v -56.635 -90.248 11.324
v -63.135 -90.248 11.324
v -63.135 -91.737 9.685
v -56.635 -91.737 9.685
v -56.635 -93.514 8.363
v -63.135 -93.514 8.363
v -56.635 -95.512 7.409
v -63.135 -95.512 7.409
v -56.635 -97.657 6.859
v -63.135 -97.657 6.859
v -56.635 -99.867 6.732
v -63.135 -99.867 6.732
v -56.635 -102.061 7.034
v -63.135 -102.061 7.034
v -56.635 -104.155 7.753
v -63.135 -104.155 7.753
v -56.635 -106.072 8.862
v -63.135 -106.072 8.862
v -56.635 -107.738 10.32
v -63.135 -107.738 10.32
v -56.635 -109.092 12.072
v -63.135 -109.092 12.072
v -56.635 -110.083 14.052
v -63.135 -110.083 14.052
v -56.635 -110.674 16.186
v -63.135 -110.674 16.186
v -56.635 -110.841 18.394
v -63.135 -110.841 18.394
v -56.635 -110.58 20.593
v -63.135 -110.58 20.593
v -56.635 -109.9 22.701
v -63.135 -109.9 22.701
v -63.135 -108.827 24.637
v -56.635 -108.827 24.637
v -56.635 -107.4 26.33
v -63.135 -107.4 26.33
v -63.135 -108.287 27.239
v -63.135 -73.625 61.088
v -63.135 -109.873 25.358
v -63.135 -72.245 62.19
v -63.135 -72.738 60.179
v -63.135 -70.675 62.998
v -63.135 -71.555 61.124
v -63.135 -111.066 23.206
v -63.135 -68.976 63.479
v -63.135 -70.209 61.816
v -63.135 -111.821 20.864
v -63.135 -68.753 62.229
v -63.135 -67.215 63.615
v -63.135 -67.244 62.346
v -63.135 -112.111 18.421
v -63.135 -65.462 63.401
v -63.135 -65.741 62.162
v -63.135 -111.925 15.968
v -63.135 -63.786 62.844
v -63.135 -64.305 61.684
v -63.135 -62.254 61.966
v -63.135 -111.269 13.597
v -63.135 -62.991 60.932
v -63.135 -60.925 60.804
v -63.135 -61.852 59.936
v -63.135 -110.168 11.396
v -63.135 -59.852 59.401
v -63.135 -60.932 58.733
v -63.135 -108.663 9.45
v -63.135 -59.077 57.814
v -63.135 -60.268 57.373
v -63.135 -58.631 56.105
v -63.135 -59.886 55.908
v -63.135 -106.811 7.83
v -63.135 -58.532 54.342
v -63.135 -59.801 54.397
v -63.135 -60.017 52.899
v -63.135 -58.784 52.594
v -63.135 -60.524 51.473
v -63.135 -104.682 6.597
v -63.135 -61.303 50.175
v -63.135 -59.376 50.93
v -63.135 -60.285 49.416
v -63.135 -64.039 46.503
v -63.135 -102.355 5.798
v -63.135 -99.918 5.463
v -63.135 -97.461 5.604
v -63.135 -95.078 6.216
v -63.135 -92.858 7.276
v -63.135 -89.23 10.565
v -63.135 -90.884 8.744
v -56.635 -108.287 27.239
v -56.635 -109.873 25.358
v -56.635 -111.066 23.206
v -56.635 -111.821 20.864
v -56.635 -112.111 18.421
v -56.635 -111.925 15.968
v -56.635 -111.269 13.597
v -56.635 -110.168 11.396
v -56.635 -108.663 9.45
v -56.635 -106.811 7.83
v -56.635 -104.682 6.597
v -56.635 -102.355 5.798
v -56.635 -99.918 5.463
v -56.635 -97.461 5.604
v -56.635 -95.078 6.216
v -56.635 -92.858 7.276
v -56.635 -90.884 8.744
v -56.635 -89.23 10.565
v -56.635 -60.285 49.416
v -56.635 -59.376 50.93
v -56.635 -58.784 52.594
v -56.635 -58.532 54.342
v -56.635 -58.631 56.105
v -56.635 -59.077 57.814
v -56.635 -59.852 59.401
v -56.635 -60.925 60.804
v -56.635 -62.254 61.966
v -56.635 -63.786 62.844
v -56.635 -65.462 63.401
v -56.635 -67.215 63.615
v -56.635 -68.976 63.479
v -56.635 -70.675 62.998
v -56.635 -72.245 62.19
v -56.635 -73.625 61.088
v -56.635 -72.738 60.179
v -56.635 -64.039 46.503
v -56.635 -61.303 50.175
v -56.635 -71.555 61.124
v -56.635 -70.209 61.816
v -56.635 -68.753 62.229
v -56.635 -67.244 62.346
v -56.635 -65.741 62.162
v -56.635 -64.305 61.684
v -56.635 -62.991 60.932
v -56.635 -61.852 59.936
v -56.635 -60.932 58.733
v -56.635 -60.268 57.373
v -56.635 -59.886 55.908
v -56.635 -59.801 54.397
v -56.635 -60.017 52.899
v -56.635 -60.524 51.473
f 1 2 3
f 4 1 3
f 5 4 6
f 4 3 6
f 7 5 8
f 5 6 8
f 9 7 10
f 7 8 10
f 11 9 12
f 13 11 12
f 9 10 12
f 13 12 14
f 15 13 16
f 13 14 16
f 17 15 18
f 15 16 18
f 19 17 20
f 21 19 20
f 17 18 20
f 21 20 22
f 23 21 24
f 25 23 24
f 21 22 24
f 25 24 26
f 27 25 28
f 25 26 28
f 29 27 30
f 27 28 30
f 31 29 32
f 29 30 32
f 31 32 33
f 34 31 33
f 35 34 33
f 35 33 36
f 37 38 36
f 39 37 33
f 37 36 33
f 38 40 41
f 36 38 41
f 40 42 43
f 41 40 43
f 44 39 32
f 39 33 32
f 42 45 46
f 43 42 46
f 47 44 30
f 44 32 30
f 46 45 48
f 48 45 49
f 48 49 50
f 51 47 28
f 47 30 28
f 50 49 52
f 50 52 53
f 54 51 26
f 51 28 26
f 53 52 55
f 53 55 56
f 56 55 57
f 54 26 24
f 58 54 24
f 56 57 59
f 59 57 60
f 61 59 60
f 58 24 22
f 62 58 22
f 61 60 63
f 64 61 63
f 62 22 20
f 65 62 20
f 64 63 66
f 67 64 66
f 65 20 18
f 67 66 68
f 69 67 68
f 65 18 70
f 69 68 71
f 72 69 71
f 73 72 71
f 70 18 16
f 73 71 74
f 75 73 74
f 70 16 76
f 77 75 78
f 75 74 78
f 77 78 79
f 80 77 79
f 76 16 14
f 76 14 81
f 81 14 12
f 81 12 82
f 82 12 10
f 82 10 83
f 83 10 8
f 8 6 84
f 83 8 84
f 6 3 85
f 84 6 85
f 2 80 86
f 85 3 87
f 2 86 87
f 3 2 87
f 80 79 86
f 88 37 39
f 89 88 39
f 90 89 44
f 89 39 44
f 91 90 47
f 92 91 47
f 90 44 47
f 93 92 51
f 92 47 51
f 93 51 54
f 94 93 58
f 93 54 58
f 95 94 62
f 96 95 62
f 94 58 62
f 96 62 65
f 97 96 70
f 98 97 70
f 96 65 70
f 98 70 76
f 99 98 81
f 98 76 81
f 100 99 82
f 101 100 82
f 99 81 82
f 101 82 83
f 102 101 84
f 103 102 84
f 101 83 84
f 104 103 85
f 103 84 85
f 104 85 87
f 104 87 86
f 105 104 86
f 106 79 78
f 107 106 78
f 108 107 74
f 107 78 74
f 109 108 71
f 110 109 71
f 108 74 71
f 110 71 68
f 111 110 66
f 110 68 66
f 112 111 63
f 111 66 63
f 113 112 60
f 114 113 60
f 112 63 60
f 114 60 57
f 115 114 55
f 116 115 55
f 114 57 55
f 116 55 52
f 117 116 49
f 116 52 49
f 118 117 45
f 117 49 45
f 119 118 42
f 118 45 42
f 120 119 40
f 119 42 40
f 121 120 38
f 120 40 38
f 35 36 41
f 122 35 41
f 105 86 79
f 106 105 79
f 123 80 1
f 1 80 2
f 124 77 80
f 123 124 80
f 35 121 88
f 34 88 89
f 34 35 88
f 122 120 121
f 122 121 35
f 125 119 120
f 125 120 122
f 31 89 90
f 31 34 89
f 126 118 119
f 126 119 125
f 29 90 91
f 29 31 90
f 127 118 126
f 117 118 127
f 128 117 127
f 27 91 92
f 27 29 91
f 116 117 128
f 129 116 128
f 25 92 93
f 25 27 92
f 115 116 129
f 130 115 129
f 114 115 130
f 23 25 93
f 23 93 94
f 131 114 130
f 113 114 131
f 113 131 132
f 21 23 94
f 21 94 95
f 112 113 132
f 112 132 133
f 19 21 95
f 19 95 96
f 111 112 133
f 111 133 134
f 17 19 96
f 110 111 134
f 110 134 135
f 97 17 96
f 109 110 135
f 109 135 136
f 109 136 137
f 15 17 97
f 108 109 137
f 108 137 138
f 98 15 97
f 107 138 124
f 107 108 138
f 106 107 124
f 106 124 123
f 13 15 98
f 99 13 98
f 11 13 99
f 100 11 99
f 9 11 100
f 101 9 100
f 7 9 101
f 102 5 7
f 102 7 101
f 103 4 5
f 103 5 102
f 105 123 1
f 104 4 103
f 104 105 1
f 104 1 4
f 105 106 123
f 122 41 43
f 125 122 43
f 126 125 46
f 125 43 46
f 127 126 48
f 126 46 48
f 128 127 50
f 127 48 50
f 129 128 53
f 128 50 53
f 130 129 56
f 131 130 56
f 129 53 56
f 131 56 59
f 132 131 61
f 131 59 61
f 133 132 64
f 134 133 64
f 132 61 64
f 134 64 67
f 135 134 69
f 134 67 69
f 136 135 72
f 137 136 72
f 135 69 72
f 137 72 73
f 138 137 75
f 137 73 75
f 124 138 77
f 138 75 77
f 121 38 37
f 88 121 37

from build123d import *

# Parameters (mm, degrees)
BOSS_EXTRUDE1_DEPTH = 6.5


with BuildPart() as part:
    # Sketch1 → Boss-Extrude1 (new body)
    with BuildSketch(Plane(origin=(-63.134662924, 0, 0), x_dir=(0, 0, -1), z_dir=(1, 0, 0))):
        with BuildLine():
            Line((-10.565276343, -89.229749456), (-49.416189654, -60.285036457))
            ThreePointArc((-49.416189654, -60.285036457), (-61.41810481, -61.560228003), (-61.087779733, -73.625175837))
            Line((-61.087779733, -73.625175837), (-27.238976455, -108.287091427))
            ThreePointArc((-27.238976455, -108.287091427), (-8.594688607, -107.776631215), (-10.565276343, -89.229749456))
        make_face()
        with BuildLine():
            Line((-26.330356711, -107.399786428), (-60.179159989, -72.737870838))
            ThreePointArc((-60.179159989, -72.737870838), (-60.46229577, -62.39648698), (-50.174939921, -61.303465655))
            Line((-50.174939921, -61.303465655), (-46.502941226, -64.039178649))
            Line((-46.502941226, -64.039178649), (-11.32402661, -90.248178655))
            ThreePointArc((-11.32402661, -90.248178655), (-9.550497648, -106.940372237), (-26.330356711, -107.399786428))
        make_face(mode=Mode.SUBTRACT)
    extrude(amount=BOSS_EXTRUDE1_DEPTH)


solid = part.part
